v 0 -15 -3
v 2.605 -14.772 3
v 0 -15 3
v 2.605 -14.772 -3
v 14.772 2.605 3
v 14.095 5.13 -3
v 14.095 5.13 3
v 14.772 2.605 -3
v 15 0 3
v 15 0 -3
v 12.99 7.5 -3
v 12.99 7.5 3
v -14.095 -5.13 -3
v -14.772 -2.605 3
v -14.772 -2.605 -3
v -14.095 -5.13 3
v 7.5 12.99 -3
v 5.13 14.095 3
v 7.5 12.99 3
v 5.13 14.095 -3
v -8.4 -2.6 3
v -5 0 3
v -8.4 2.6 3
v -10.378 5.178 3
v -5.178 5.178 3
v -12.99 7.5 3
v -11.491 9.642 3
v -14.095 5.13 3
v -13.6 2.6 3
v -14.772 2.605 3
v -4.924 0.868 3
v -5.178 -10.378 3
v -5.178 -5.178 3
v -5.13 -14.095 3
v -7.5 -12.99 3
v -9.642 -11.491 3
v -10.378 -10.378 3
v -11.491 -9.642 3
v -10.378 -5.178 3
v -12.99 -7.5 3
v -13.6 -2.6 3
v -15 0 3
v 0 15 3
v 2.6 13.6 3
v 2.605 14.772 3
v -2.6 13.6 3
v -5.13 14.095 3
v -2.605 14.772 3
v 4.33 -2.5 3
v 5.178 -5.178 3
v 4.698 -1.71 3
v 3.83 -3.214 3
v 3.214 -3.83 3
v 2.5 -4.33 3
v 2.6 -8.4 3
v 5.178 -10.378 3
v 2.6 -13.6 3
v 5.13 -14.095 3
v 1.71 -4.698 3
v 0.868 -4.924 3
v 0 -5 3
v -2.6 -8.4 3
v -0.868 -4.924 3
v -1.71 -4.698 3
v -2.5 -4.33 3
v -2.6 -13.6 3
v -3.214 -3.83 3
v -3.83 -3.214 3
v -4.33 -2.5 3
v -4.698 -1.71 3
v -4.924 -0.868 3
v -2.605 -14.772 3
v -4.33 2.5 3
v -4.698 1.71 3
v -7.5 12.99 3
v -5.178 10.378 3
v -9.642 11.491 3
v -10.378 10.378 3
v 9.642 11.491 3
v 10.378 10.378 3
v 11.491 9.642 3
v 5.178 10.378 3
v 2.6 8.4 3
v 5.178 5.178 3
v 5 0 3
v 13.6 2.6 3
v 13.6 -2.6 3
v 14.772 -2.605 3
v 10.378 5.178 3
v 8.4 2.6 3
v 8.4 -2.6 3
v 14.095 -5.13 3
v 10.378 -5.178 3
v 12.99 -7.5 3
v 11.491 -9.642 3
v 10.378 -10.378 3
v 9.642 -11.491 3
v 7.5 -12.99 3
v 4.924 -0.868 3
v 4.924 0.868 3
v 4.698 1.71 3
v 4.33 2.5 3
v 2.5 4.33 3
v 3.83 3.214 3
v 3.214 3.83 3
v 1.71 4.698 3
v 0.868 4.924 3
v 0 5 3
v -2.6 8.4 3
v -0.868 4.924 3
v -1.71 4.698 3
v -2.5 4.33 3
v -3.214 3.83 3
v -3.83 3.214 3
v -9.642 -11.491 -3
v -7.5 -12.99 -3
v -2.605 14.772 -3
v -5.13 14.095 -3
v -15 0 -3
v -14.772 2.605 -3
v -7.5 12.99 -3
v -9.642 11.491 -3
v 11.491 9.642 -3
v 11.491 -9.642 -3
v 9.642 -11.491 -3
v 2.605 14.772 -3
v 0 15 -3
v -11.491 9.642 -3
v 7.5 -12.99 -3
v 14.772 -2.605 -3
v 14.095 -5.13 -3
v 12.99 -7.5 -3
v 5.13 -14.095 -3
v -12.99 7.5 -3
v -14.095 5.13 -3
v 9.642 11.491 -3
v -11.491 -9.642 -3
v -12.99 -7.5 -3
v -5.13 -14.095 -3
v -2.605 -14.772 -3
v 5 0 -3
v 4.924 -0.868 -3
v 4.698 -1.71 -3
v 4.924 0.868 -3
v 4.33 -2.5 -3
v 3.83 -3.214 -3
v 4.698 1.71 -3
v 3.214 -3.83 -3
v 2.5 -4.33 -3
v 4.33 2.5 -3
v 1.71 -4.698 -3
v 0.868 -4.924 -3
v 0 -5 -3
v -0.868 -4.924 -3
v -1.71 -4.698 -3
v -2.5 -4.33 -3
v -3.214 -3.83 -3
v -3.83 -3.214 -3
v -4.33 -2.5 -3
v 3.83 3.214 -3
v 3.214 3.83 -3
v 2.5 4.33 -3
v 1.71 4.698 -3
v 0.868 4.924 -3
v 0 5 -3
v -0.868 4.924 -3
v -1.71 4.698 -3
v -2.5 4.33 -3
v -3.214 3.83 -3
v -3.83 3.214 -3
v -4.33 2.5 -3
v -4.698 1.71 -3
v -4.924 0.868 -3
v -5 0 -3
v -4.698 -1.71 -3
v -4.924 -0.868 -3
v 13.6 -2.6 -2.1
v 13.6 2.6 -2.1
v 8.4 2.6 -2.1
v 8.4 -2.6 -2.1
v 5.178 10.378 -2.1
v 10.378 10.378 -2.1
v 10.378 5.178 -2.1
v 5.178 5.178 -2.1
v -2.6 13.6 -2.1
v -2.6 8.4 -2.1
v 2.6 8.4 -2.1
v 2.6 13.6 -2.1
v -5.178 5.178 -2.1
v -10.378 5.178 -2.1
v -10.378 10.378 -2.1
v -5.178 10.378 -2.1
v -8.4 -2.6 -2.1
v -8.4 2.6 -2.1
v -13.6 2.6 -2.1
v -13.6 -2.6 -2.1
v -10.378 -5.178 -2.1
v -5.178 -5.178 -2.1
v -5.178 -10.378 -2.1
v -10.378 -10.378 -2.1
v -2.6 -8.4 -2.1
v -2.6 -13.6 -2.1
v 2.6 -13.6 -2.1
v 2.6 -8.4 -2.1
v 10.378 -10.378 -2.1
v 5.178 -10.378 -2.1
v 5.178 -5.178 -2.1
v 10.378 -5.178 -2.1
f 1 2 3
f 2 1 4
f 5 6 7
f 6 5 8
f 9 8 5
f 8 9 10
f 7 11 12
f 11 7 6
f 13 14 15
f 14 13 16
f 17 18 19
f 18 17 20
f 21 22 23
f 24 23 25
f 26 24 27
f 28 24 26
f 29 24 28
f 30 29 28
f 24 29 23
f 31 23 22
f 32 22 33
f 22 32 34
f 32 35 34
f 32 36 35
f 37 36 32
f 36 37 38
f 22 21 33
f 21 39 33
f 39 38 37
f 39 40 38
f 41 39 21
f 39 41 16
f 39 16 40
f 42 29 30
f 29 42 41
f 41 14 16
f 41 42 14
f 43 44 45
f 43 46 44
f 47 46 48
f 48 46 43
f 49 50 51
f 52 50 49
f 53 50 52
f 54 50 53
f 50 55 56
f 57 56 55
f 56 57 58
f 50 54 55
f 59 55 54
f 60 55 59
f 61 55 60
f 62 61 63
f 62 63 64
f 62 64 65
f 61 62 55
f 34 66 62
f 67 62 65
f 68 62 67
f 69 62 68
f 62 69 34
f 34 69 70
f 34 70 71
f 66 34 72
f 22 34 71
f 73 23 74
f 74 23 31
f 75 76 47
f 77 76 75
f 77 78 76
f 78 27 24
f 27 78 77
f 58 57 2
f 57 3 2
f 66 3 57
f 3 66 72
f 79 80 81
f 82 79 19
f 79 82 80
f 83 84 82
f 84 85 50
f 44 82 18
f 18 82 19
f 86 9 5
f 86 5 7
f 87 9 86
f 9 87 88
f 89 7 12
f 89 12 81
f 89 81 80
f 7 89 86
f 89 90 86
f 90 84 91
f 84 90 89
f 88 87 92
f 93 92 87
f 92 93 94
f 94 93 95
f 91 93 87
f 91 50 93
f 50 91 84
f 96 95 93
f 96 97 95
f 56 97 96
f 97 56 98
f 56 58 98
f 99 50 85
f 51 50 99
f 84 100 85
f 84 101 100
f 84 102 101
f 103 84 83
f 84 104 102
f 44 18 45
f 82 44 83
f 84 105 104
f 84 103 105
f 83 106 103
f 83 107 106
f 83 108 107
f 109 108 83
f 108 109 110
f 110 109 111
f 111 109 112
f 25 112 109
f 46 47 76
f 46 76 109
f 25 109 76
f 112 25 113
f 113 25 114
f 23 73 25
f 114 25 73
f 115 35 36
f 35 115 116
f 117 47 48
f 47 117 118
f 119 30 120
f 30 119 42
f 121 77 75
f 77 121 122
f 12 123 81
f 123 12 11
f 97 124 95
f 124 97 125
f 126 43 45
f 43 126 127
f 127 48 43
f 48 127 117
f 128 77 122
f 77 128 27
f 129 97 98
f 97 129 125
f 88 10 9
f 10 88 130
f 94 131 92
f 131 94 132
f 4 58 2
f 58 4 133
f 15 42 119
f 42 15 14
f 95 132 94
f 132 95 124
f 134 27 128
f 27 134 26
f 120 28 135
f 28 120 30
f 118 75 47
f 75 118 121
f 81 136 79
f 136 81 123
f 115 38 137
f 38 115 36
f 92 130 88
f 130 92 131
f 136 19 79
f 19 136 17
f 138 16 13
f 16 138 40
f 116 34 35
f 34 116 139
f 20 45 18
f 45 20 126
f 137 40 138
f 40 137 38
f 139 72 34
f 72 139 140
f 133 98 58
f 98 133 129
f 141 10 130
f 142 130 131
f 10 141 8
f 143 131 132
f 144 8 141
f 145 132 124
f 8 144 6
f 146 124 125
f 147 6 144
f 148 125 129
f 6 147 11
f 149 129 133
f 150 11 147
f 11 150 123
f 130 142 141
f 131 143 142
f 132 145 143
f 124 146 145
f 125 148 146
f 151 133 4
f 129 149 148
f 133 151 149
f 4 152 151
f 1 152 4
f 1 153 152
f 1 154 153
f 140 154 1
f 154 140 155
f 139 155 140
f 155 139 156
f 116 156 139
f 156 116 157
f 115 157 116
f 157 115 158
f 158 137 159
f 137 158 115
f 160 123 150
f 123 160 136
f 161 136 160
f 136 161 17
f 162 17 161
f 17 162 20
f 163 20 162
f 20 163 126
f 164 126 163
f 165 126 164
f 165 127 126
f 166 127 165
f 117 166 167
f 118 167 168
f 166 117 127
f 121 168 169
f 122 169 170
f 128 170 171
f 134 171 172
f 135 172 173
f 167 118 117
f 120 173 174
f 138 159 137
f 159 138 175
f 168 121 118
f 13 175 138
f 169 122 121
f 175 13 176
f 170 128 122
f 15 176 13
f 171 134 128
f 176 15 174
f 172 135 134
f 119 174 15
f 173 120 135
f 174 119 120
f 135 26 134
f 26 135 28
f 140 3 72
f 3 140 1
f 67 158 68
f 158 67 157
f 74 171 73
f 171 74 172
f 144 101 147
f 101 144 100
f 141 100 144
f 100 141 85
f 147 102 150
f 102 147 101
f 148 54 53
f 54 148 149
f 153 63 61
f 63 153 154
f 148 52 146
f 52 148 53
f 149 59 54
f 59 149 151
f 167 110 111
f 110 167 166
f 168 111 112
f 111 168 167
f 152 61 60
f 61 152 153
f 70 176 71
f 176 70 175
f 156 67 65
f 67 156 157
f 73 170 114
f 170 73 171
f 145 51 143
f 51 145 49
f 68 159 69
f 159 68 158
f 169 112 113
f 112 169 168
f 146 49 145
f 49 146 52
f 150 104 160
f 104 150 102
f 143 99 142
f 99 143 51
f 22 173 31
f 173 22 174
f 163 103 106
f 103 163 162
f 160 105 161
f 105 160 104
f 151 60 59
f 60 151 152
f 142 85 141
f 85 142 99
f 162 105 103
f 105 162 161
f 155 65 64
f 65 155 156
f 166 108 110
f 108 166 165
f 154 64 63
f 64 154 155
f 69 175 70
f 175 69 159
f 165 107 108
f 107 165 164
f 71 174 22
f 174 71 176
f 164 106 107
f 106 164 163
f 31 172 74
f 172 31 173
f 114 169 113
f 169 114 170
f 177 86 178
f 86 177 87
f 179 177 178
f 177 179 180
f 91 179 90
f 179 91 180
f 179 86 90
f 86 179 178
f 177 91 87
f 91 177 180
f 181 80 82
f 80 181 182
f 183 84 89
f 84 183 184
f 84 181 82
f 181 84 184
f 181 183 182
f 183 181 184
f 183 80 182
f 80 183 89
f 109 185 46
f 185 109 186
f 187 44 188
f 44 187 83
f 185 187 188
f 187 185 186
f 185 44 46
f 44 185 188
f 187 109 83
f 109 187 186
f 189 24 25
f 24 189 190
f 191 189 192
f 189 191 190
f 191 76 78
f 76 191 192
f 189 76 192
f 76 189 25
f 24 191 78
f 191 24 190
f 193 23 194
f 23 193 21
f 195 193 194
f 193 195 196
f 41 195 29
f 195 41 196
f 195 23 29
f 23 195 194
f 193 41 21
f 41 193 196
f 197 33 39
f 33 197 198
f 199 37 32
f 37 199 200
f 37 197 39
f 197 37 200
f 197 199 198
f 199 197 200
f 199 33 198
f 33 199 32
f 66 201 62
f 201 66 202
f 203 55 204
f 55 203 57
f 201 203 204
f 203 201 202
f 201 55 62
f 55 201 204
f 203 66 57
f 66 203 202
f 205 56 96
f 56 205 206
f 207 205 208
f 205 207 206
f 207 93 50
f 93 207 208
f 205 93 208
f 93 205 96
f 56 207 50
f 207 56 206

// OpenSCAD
h=6;    // height
ro=15;  // outer radius
ri=5;   // inner radius
M=8;    // number of magnets
a=5.2;  // size of the hole for the cubes
r=11;   // radial displacement of hole center
m=1;    // multipolarity (1: dipole, 2: quadrupole)
//phi=45; 

module frame_ring(h,ro,ri){
    difference() {
        cylinder(h,r=ro,$fn=36,center=true);
        cylinder(2*h,r=ri,$fn=36,center=true);
    }
}
//frame_ring(h,ro,ri);

module magnet_cube(a,r,m,phi) {
rotate([0,0,phi]) translate([r,0,0]) 
    rotate([0,0,m*phi]) cube([a,a,a],center=true);
}

module magnet_holes(M) {
    for (i=[0:M-1]) magnet_cube(a,r,m,i*360/M);
}

difference (){
  frame_ring(h,ro,ri);
  translate([0,0,0.5]) magnet_holes(M);
}
